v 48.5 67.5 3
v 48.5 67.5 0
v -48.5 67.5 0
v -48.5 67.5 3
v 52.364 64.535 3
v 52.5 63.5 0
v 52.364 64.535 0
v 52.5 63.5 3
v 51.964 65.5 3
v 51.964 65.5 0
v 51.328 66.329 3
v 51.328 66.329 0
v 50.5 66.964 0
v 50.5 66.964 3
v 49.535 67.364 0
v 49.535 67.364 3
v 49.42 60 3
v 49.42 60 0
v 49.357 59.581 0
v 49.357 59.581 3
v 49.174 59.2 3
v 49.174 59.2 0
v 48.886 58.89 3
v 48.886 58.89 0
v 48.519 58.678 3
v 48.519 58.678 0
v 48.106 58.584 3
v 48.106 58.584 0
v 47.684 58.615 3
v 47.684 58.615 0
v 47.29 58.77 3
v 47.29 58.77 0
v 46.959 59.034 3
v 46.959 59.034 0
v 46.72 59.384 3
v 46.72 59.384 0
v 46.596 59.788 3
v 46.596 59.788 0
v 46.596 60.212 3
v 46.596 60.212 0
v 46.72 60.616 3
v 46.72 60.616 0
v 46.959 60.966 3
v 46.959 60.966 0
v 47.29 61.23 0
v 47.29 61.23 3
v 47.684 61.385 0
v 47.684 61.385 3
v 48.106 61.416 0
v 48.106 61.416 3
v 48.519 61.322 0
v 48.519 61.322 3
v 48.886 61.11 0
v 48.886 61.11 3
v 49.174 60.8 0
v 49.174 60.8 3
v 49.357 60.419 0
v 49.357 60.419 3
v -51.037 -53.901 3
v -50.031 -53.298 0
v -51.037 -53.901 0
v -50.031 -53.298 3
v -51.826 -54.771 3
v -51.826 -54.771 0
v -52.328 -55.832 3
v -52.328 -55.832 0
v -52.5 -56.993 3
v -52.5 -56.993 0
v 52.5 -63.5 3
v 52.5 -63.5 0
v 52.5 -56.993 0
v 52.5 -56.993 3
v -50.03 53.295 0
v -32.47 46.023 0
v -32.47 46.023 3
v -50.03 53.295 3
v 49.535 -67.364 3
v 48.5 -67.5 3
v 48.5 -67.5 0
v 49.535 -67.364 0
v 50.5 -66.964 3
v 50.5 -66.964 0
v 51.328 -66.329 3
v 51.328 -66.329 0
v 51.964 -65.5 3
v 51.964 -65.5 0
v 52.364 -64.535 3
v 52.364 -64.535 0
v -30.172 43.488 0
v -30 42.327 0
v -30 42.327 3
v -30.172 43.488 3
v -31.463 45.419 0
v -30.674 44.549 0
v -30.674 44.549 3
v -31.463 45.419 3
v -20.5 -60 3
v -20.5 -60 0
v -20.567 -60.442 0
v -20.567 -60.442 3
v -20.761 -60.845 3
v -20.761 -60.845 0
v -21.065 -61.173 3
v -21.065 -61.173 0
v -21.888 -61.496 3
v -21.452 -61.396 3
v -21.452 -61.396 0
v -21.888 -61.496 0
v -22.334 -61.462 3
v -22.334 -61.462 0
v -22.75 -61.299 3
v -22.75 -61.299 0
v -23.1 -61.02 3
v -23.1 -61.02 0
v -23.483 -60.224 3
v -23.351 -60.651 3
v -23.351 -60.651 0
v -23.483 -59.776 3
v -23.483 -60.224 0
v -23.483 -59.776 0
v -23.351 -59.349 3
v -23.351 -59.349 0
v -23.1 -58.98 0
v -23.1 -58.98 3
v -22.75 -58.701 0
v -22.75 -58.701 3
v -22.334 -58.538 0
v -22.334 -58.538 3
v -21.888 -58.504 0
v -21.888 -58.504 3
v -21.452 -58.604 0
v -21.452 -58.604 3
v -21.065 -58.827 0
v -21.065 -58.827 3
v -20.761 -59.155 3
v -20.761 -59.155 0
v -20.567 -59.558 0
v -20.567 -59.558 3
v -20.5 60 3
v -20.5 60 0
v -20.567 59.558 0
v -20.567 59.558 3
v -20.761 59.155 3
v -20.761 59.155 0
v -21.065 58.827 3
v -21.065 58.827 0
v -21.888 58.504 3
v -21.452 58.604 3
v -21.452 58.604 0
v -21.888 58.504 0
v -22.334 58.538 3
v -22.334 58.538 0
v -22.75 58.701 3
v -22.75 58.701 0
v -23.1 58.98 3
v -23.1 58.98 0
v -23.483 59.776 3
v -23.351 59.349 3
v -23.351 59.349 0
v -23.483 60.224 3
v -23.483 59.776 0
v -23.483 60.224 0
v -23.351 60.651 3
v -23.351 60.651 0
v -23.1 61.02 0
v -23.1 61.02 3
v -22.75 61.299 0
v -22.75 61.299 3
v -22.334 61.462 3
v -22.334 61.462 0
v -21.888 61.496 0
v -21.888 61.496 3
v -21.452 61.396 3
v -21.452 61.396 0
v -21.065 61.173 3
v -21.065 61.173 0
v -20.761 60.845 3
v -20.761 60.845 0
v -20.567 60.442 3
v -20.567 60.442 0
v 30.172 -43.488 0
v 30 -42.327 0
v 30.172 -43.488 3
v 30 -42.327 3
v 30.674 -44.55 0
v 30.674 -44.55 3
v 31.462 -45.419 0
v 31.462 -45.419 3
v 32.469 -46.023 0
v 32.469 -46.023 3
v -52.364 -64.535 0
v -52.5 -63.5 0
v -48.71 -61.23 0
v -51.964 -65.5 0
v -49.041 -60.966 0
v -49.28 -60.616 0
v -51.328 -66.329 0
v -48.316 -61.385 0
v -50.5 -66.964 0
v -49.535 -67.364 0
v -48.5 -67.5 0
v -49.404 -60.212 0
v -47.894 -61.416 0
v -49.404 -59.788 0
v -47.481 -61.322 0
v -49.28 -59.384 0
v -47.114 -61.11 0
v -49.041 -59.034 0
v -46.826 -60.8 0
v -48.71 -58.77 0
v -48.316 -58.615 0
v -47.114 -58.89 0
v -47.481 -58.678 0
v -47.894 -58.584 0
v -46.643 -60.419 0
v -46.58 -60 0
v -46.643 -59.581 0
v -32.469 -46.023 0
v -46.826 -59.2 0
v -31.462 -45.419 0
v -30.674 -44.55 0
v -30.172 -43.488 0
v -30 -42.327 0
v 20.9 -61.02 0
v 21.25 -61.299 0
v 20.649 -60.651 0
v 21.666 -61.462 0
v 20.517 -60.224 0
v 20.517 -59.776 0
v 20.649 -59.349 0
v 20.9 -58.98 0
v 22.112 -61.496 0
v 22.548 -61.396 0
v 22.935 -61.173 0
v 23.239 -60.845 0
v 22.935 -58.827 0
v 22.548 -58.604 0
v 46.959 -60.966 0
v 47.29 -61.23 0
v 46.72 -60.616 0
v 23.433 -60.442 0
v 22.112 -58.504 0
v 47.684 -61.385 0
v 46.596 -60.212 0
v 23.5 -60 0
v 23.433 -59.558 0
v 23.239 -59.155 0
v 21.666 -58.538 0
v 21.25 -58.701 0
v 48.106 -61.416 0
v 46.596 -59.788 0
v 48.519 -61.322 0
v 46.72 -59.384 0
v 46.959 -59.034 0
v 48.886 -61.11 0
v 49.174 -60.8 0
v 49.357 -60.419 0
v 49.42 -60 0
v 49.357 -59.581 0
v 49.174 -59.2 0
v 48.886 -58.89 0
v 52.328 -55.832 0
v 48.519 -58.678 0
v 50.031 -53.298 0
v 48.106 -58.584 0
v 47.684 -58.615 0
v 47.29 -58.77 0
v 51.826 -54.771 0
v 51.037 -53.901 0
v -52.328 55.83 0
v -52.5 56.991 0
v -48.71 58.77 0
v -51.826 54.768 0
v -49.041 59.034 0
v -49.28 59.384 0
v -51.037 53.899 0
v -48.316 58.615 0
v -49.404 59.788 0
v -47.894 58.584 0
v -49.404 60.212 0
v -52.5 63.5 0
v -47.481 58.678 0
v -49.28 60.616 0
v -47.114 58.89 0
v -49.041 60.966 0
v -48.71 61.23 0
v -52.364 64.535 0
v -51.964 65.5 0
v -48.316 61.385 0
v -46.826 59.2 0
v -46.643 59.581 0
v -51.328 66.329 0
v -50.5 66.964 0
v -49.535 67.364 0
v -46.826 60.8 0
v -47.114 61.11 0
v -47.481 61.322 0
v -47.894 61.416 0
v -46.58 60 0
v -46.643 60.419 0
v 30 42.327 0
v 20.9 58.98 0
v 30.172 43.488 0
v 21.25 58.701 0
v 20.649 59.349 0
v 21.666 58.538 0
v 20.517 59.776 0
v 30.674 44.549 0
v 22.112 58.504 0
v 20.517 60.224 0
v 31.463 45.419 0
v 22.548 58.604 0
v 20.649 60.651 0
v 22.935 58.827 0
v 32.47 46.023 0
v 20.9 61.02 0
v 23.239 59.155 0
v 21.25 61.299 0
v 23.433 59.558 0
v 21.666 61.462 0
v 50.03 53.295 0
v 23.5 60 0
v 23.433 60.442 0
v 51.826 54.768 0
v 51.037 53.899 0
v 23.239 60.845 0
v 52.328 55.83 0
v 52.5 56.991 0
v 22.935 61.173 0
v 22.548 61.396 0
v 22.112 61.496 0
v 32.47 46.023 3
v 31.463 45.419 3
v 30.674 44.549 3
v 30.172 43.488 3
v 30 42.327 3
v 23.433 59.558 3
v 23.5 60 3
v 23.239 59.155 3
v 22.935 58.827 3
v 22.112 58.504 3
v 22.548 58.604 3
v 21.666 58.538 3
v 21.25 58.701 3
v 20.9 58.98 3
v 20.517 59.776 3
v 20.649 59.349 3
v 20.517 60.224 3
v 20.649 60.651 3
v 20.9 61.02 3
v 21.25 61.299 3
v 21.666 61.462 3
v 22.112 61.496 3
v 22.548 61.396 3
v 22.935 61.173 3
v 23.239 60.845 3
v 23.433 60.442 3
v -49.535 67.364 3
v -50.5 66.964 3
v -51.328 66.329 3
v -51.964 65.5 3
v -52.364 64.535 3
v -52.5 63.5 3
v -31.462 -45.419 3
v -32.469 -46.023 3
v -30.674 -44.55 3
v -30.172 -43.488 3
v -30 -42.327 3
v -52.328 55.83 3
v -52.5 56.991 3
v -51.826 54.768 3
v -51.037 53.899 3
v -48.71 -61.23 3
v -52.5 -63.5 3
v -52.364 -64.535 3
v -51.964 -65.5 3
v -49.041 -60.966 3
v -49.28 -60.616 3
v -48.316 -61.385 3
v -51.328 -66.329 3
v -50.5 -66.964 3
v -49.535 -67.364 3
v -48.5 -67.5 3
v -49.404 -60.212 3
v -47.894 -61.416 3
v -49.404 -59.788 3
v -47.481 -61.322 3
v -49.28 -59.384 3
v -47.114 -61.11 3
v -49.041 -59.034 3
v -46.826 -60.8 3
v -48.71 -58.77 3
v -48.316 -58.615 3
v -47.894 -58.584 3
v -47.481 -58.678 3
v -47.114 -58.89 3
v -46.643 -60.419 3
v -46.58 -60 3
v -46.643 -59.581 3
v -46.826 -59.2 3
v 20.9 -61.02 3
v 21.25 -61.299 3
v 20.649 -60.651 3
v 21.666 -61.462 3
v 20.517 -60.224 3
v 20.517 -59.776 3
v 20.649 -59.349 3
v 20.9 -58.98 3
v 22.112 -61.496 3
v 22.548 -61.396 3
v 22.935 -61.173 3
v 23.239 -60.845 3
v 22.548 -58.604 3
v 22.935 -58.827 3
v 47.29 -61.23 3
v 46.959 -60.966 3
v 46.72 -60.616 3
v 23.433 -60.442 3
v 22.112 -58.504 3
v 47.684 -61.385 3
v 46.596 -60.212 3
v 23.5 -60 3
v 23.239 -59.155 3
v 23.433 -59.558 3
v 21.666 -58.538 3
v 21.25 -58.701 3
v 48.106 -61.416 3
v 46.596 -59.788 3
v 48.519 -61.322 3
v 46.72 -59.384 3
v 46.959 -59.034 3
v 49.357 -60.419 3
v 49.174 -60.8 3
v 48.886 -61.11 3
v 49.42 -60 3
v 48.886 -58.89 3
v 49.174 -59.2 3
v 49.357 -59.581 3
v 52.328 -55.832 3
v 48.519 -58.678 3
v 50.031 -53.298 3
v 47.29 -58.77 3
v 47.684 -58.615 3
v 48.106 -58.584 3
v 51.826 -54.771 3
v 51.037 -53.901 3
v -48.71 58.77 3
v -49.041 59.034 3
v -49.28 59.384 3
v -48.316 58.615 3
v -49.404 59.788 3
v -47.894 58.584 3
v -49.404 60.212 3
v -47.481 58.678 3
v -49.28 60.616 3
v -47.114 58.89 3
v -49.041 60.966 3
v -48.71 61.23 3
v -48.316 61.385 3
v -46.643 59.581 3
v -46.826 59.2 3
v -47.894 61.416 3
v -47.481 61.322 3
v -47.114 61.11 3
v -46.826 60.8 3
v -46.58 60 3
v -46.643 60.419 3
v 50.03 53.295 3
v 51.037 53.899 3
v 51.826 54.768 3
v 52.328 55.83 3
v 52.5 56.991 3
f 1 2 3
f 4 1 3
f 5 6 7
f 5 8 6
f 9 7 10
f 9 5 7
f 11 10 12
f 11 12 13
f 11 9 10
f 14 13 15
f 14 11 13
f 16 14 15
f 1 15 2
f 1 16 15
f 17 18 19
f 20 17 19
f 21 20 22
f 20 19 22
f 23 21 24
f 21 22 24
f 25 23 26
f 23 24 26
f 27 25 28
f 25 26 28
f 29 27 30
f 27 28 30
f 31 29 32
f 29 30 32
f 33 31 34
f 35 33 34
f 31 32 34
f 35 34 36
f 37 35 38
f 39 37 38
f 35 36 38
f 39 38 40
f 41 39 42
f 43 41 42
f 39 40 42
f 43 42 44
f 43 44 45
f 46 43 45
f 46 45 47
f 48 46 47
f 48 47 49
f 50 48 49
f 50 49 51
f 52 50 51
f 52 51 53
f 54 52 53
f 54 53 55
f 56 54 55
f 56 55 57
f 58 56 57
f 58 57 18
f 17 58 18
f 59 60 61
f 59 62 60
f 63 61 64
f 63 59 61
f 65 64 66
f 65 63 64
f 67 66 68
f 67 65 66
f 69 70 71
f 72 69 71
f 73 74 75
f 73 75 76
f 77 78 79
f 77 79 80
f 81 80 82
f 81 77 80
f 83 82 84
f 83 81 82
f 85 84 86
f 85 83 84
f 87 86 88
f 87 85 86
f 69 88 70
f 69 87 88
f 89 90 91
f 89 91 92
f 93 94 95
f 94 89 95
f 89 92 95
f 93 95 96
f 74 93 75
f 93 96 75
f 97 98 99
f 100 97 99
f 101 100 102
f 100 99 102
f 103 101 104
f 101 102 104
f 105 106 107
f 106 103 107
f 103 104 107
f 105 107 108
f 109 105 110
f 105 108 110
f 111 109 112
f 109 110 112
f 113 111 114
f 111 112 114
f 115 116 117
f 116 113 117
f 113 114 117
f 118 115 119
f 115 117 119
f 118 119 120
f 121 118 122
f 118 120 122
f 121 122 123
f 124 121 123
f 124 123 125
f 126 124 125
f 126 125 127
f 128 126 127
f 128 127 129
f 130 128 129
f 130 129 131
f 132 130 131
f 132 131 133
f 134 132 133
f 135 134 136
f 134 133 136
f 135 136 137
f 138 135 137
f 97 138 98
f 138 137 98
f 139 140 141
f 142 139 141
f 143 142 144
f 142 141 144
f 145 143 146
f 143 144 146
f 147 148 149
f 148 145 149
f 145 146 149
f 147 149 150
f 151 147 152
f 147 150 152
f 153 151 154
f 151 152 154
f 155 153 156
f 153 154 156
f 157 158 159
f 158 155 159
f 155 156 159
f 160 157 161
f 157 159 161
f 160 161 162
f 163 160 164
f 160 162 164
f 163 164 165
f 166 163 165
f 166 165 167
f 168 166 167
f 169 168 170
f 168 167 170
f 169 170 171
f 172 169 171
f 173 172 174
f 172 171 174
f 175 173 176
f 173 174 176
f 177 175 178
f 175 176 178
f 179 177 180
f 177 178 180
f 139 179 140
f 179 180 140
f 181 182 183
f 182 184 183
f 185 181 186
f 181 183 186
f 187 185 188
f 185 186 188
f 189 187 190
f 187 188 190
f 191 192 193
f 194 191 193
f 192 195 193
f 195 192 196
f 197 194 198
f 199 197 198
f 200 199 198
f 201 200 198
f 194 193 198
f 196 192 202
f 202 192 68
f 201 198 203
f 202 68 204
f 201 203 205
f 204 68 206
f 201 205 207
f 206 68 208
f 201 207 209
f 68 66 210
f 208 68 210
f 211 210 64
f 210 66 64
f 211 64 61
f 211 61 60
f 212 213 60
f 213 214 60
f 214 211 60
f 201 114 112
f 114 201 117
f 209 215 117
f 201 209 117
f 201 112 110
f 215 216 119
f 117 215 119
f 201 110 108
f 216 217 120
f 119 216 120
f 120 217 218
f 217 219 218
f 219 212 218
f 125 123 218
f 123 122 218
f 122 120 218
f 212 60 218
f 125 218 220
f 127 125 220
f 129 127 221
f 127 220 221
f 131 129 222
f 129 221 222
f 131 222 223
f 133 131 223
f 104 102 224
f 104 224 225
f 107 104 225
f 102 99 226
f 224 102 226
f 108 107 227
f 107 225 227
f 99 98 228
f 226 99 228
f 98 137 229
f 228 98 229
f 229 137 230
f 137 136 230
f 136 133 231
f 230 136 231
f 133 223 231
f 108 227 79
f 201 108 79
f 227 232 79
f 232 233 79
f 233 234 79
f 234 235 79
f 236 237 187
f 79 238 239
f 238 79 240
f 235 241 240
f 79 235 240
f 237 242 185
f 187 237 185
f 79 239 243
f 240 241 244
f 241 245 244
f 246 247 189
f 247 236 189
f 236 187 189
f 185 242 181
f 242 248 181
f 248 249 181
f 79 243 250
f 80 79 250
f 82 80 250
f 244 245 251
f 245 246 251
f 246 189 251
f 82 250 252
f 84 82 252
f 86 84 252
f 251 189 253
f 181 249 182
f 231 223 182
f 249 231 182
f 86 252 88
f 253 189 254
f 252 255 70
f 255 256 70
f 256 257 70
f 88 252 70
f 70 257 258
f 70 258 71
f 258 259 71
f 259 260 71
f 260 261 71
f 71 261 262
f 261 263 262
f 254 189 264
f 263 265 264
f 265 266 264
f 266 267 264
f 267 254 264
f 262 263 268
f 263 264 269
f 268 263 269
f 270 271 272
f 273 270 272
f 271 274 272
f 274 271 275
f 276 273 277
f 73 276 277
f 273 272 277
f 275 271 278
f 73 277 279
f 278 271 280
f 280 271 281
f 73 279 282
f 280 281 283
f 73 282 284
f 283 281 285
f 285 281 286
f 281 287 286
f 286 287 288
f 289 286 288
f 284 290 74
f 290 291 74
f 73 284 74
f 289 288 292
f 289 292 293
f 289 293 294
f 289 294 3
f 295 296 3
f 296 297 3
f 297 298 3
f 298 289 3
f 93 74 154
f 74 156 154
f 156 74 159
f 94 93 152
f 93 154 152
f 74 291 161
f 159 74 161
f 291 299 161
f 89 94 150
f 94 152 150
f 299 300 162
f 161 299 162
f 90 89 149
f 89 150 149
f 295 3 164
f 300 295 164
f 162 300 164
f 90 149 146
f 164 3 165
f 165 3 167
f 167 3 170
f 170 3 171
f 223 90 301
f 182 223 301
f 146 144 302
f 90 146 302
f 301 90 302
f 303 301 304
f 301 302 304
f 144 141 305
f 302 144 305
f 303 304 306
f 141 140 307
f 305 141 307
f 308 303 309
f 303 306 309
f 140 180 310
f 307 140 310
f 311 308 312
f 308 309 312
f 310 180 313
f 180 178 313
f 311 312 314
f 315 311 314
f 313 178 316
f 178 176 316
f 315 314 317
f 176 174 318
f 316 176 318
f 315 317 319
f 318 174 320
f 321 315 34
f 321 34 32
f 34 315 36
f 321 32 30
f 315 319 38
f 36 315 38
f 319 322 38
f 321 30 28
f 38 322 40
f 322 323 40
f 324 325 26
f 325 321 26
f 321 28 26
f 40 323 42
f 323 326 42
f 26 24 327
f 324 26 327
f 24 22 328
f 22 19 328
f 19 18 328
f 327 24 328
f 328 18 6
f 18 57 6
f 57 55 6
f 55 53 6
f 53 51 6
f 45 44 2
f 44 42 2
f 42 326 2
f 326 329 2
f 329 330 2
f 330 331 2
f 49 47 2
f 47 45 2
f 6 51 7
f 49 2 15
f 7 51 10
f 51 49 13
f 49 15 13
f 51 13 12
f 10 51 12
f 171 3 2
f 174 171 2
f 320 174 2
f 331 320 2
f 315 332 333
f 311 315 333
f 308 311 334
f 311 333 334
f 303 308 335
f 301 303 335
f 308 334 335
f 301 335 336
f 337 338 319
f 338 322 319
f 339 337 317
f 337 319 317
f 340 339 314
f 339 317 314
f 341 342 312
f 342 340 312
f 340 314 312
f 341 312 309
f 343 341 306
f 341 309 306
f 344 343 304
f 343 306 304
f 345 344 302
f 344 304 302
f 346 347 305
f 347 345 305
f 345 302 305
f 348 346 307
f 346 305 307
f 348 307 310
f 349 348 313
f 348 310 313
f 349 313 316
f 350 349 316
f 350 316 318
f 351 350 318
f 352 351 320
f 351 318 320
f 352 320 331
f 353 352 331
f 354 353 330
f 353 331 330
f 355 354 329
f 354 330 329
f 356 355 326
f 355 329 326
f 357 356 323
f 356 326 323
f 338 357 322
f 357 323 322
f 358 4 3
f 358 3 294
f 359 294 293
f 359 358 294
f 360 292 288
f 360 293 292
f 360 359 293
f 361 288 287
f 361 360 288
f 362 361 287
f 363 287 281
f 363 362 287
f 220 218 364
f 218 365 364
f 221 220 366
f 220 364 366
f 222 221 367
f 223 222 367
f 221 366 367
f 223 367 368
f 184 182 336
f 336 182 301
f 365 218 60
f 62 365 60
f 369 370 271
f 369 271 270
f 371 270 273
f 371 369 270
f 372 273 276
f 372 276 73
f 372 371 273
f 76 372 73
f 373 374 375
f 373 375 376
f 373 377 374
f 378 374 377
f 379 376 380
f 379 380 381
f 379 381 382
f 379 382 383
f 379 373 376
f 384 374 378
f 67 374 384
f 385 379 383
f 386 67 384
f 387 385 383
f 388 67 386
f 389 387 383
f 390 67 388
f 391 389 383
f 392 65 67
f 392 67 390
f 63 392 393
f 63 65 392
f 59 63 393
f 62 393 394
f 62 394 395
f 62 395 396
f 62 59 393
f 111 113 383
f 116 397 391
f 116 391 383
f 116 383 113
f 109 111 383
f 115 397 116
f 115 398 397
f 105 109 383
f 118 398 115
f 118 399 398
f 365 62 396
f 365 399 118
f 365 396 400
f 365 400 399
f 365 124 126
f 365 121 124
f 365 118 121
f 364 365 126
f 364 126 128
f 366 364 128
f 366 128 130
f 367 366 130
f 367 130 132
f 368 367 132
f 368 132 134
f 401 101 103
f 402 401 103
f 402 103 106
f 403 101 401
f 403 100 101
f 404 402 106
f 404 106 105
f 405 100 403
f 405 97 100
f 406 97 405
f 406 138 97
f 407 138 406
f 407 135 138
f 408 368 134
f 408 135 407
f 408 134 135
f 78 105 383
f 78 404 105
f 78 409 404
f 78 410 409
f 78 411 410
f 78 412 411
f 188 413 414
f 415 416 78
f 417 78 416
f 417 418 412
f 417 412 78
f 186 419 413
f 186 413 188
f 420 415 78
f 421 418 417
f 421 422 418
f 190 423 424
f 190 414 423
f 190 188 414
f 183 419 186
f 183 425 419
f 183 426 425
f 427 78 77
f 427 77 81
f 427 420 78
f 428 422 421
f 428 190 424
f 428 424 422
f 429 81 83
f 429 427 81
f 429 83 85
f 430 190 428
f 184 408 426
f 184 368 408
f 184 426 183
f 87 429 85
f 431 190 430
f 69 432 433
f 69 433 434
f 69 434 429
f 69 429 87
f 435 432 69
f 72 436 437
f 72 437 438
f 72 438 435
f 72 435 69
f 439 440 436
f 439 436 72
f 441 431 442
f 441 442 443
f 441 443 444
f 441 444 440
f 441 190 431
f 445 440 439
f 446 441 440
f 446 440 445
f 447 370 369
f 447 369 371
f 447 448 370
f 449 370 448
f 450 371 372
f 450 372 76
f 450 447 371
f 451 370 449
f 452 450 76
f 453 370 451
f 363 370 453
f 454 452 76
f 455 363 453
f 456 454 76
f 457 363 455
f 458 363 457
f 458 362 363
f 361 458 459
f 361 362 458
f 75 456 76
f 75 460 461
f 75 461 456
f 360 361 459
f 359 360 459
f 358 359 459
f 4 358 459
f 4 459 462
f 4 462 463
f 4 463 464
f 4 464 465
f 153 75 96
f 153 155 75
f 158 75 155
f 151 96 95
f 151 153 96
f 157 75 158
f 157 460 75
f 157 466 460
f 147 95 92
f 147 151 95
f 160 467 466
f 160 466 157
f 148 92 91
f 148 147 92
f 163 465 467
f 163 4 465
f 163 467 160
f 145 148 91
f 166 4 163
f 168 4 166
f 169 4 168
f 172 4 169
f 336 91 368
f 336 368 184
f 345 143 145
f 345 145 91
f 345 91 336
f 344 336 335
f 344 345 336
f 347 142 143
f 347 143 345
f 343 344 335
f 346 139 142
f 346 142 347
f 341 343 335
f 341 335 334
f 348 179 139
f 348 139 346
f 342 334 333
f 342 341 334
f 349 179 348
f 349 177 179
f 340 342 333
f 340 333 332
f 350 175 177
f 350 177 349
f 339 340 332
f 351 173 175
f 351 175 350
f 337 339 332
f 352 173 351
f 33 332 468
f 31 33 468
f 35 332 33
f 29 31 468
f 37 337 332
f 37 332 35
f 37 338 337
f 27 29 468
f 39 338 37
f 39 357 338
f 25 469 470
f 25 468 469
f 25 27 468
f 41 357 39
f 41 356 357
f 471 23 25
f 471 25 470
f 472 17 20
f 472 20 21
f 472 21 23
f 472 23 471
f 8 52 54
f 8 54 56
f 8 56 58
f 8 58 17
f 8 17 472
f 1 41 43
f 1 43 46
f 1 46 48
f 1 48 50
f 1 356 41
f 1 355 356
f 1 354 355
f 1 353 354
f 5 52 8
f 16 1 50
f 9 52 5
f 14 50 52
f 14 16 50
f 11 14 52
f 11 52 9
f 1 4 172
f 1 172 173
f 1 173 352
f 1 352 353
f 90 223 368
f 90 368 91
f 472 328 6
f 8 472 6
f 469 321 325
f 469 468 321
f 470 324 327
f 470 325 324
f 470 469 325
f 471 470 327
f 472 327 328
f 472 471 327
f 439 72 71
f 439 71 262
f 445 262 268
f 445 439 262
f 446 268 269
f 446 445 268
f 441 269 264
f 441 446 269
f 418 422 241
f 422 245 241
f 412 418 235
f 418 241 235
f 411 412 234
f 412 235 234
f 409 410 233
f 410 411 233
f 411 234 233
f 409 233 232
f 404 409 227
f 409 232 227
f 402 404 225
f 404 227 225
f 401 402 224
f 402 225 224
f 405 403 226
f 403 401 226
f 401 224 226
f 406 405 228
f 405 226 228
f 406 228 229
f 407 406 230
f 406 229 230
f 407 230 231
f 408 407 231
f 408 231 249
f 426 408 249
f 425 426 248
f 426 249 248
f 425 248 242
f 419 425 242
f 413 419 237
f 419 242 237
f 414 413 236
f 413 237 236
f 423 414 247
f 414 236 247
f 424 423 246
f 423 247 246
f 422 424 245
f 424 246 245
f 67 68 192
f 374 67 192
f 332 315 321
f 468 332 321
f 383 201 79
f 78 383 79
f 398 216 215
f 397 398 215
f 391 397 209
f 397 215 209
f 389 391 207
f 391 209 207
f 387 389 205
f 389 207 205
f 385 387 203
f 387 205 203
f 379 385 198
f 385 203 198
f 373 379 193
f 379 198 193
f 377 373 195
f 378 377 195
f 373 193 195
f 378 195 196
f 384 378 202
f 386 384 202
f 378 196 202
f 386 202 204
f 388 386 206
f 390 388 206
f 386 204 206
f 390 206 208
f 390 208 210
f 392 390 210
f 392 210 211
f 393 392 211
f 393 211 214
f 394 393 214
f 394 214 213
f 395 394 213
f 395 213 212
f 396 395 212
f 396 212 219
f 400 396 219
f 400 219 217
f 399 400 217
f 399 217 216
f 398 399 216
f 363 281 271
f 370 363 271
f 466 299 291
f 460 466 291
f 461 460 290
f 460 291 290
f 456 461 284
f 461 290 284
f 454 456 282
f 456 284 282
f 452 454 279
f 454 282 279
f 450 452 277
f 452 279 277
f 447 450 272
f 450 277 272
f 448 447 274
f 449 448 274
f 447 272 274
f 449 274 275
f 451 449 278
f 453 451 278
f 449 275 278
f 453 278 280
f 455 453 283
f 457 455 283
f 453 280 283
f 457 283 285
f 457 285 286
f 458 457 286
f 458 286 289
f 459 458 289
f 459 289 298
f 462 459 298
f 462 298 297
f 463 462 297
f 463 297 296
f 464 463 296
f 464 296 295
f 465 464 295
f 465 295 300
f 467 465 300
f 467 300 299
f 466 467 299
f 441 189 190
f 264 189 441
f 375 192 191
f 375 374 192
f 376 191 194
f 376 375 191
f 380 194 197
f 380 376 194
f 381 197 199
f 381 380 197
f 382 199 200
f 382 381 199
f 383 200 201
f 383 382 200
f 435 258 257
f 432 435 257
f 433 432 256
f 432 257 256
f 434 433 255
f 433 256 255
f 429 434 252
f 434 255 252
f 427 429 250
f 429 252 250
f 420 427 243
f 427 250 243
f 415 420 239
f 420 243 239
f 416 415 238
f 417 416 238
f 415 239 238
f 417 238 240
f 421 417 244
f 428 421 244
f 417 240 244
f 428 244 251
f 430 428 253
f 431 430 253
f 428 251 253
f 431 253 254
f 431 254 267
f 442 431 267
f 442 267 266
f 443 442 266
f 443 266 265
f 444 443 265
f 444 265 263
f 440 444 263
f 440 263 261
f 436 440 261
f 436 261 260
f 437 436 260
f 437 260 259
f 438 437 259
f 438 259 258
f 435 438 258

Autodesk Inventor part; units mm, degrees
ref_plane "YZ Plane" through (0, 0, 0) normal (1, 0, 0) x (0, 1, 0)
ref_plane "XZ Plane" through (0, 0, 0) normal (0, 1, 0) x (-1, 0, 0)
ref_plane "XY Plane" through (0, 0, 0) normal (0, 0, 1) x (1, 0, 0)
sketch "Sketch1" plane through (0, 0, 0) normal (0, 0, 1) x (1, 0, 0)
  point P0 (0, 0)
sketch "Sketch2" plane through (0, 0, 0) normal (0, 0, 1) x (1, 0, 0)
  line L0 (-52.4998, -67.5002) -> (52.4998, -67.5002)
  line L1 (52.4998, -67.5002) -> (52.4998, 67.5002)
  line L2 (52.4998, 67.5002) -> (-52.4998, 67.5002)
  line L3 (-52.4998, 67.5002) -> (-52.4998, -67.5002)
  circle A0 centre (22, 60) radius 1.4999
  circle A1 centre (-22, 60) radius 1.4999
  circle A2 centre (22, -60) radius 1.4999
  circle A3 centre (-22, -60) radius 1.4999
  line L4 (0, -44.9999) -> (0, 44.9999)
  line L5 (30, -44.9999) -> (30, 44.9999)
  line L6 (30, 44.9999) -> (52.4998, 54.3179)
  line L7 (30, -44.9999) -> (52.4998, -54.3208)
  line L8 (-30, -44.9999) -> (-30, 44.9999)
  line L9 (-30, 44.9999) -> (-52.4998, 54.3179)
  line L10 (-30, -44.9999) -> (-52.4998, -54.3208)
  circle A4 centre (0, 0) radius 1.4203
  circle A5 centre (48, 60) radius 1.4203
  circle A6 centre (-48, 60) radius 1.4203
  circle A7 centre (48, -60) radius 1.4203
  circle A8 centre (-48, -60) radius 1.4203
extrude "Extrusion3" add sketch "Sketch2" along normal blind 3 contours L3 L10 L8 L9 L2 L1 L6 L5 L7 L0 | L3 L9 L8 L10 | L7 L5 L6 L1 | A4 L4 | L4 A4 | A5 | A6 | A7 | A8
fillet "Fillet4" radius 4 4 edges at (-52.4998, 67.5002, 1.5) (52.4998, 67.5002, 1.5) (52.4998, -67.5002, 1.5) (-52.4998, -67.5002, 1.5)
extrude "Extrusion4" cut sketch "Sketch2" along normal blind 10 contours L3 L9 L8 L10 | L7 L5 L6 L1
fillet "Fillet5" radius 4 8 edges at (52.4998, 54.3179, 1.5) (30, 44.9999, 1.5) (-30, 44.9999, 1.5) (-52.4998, 54.3179, 1.5) (-30, -44.9999, 1.5) (-52.4998, -54.3208, 1.5) (30, -44.9999, 1.5) (52.4998, -54.3208, 1.5)
extrude "Extrusion5" cut sketch "Sketch2" along normal blind 10 contours A5 | A6 | A7 | A8
properties part number "Controller - Power Board v2"
